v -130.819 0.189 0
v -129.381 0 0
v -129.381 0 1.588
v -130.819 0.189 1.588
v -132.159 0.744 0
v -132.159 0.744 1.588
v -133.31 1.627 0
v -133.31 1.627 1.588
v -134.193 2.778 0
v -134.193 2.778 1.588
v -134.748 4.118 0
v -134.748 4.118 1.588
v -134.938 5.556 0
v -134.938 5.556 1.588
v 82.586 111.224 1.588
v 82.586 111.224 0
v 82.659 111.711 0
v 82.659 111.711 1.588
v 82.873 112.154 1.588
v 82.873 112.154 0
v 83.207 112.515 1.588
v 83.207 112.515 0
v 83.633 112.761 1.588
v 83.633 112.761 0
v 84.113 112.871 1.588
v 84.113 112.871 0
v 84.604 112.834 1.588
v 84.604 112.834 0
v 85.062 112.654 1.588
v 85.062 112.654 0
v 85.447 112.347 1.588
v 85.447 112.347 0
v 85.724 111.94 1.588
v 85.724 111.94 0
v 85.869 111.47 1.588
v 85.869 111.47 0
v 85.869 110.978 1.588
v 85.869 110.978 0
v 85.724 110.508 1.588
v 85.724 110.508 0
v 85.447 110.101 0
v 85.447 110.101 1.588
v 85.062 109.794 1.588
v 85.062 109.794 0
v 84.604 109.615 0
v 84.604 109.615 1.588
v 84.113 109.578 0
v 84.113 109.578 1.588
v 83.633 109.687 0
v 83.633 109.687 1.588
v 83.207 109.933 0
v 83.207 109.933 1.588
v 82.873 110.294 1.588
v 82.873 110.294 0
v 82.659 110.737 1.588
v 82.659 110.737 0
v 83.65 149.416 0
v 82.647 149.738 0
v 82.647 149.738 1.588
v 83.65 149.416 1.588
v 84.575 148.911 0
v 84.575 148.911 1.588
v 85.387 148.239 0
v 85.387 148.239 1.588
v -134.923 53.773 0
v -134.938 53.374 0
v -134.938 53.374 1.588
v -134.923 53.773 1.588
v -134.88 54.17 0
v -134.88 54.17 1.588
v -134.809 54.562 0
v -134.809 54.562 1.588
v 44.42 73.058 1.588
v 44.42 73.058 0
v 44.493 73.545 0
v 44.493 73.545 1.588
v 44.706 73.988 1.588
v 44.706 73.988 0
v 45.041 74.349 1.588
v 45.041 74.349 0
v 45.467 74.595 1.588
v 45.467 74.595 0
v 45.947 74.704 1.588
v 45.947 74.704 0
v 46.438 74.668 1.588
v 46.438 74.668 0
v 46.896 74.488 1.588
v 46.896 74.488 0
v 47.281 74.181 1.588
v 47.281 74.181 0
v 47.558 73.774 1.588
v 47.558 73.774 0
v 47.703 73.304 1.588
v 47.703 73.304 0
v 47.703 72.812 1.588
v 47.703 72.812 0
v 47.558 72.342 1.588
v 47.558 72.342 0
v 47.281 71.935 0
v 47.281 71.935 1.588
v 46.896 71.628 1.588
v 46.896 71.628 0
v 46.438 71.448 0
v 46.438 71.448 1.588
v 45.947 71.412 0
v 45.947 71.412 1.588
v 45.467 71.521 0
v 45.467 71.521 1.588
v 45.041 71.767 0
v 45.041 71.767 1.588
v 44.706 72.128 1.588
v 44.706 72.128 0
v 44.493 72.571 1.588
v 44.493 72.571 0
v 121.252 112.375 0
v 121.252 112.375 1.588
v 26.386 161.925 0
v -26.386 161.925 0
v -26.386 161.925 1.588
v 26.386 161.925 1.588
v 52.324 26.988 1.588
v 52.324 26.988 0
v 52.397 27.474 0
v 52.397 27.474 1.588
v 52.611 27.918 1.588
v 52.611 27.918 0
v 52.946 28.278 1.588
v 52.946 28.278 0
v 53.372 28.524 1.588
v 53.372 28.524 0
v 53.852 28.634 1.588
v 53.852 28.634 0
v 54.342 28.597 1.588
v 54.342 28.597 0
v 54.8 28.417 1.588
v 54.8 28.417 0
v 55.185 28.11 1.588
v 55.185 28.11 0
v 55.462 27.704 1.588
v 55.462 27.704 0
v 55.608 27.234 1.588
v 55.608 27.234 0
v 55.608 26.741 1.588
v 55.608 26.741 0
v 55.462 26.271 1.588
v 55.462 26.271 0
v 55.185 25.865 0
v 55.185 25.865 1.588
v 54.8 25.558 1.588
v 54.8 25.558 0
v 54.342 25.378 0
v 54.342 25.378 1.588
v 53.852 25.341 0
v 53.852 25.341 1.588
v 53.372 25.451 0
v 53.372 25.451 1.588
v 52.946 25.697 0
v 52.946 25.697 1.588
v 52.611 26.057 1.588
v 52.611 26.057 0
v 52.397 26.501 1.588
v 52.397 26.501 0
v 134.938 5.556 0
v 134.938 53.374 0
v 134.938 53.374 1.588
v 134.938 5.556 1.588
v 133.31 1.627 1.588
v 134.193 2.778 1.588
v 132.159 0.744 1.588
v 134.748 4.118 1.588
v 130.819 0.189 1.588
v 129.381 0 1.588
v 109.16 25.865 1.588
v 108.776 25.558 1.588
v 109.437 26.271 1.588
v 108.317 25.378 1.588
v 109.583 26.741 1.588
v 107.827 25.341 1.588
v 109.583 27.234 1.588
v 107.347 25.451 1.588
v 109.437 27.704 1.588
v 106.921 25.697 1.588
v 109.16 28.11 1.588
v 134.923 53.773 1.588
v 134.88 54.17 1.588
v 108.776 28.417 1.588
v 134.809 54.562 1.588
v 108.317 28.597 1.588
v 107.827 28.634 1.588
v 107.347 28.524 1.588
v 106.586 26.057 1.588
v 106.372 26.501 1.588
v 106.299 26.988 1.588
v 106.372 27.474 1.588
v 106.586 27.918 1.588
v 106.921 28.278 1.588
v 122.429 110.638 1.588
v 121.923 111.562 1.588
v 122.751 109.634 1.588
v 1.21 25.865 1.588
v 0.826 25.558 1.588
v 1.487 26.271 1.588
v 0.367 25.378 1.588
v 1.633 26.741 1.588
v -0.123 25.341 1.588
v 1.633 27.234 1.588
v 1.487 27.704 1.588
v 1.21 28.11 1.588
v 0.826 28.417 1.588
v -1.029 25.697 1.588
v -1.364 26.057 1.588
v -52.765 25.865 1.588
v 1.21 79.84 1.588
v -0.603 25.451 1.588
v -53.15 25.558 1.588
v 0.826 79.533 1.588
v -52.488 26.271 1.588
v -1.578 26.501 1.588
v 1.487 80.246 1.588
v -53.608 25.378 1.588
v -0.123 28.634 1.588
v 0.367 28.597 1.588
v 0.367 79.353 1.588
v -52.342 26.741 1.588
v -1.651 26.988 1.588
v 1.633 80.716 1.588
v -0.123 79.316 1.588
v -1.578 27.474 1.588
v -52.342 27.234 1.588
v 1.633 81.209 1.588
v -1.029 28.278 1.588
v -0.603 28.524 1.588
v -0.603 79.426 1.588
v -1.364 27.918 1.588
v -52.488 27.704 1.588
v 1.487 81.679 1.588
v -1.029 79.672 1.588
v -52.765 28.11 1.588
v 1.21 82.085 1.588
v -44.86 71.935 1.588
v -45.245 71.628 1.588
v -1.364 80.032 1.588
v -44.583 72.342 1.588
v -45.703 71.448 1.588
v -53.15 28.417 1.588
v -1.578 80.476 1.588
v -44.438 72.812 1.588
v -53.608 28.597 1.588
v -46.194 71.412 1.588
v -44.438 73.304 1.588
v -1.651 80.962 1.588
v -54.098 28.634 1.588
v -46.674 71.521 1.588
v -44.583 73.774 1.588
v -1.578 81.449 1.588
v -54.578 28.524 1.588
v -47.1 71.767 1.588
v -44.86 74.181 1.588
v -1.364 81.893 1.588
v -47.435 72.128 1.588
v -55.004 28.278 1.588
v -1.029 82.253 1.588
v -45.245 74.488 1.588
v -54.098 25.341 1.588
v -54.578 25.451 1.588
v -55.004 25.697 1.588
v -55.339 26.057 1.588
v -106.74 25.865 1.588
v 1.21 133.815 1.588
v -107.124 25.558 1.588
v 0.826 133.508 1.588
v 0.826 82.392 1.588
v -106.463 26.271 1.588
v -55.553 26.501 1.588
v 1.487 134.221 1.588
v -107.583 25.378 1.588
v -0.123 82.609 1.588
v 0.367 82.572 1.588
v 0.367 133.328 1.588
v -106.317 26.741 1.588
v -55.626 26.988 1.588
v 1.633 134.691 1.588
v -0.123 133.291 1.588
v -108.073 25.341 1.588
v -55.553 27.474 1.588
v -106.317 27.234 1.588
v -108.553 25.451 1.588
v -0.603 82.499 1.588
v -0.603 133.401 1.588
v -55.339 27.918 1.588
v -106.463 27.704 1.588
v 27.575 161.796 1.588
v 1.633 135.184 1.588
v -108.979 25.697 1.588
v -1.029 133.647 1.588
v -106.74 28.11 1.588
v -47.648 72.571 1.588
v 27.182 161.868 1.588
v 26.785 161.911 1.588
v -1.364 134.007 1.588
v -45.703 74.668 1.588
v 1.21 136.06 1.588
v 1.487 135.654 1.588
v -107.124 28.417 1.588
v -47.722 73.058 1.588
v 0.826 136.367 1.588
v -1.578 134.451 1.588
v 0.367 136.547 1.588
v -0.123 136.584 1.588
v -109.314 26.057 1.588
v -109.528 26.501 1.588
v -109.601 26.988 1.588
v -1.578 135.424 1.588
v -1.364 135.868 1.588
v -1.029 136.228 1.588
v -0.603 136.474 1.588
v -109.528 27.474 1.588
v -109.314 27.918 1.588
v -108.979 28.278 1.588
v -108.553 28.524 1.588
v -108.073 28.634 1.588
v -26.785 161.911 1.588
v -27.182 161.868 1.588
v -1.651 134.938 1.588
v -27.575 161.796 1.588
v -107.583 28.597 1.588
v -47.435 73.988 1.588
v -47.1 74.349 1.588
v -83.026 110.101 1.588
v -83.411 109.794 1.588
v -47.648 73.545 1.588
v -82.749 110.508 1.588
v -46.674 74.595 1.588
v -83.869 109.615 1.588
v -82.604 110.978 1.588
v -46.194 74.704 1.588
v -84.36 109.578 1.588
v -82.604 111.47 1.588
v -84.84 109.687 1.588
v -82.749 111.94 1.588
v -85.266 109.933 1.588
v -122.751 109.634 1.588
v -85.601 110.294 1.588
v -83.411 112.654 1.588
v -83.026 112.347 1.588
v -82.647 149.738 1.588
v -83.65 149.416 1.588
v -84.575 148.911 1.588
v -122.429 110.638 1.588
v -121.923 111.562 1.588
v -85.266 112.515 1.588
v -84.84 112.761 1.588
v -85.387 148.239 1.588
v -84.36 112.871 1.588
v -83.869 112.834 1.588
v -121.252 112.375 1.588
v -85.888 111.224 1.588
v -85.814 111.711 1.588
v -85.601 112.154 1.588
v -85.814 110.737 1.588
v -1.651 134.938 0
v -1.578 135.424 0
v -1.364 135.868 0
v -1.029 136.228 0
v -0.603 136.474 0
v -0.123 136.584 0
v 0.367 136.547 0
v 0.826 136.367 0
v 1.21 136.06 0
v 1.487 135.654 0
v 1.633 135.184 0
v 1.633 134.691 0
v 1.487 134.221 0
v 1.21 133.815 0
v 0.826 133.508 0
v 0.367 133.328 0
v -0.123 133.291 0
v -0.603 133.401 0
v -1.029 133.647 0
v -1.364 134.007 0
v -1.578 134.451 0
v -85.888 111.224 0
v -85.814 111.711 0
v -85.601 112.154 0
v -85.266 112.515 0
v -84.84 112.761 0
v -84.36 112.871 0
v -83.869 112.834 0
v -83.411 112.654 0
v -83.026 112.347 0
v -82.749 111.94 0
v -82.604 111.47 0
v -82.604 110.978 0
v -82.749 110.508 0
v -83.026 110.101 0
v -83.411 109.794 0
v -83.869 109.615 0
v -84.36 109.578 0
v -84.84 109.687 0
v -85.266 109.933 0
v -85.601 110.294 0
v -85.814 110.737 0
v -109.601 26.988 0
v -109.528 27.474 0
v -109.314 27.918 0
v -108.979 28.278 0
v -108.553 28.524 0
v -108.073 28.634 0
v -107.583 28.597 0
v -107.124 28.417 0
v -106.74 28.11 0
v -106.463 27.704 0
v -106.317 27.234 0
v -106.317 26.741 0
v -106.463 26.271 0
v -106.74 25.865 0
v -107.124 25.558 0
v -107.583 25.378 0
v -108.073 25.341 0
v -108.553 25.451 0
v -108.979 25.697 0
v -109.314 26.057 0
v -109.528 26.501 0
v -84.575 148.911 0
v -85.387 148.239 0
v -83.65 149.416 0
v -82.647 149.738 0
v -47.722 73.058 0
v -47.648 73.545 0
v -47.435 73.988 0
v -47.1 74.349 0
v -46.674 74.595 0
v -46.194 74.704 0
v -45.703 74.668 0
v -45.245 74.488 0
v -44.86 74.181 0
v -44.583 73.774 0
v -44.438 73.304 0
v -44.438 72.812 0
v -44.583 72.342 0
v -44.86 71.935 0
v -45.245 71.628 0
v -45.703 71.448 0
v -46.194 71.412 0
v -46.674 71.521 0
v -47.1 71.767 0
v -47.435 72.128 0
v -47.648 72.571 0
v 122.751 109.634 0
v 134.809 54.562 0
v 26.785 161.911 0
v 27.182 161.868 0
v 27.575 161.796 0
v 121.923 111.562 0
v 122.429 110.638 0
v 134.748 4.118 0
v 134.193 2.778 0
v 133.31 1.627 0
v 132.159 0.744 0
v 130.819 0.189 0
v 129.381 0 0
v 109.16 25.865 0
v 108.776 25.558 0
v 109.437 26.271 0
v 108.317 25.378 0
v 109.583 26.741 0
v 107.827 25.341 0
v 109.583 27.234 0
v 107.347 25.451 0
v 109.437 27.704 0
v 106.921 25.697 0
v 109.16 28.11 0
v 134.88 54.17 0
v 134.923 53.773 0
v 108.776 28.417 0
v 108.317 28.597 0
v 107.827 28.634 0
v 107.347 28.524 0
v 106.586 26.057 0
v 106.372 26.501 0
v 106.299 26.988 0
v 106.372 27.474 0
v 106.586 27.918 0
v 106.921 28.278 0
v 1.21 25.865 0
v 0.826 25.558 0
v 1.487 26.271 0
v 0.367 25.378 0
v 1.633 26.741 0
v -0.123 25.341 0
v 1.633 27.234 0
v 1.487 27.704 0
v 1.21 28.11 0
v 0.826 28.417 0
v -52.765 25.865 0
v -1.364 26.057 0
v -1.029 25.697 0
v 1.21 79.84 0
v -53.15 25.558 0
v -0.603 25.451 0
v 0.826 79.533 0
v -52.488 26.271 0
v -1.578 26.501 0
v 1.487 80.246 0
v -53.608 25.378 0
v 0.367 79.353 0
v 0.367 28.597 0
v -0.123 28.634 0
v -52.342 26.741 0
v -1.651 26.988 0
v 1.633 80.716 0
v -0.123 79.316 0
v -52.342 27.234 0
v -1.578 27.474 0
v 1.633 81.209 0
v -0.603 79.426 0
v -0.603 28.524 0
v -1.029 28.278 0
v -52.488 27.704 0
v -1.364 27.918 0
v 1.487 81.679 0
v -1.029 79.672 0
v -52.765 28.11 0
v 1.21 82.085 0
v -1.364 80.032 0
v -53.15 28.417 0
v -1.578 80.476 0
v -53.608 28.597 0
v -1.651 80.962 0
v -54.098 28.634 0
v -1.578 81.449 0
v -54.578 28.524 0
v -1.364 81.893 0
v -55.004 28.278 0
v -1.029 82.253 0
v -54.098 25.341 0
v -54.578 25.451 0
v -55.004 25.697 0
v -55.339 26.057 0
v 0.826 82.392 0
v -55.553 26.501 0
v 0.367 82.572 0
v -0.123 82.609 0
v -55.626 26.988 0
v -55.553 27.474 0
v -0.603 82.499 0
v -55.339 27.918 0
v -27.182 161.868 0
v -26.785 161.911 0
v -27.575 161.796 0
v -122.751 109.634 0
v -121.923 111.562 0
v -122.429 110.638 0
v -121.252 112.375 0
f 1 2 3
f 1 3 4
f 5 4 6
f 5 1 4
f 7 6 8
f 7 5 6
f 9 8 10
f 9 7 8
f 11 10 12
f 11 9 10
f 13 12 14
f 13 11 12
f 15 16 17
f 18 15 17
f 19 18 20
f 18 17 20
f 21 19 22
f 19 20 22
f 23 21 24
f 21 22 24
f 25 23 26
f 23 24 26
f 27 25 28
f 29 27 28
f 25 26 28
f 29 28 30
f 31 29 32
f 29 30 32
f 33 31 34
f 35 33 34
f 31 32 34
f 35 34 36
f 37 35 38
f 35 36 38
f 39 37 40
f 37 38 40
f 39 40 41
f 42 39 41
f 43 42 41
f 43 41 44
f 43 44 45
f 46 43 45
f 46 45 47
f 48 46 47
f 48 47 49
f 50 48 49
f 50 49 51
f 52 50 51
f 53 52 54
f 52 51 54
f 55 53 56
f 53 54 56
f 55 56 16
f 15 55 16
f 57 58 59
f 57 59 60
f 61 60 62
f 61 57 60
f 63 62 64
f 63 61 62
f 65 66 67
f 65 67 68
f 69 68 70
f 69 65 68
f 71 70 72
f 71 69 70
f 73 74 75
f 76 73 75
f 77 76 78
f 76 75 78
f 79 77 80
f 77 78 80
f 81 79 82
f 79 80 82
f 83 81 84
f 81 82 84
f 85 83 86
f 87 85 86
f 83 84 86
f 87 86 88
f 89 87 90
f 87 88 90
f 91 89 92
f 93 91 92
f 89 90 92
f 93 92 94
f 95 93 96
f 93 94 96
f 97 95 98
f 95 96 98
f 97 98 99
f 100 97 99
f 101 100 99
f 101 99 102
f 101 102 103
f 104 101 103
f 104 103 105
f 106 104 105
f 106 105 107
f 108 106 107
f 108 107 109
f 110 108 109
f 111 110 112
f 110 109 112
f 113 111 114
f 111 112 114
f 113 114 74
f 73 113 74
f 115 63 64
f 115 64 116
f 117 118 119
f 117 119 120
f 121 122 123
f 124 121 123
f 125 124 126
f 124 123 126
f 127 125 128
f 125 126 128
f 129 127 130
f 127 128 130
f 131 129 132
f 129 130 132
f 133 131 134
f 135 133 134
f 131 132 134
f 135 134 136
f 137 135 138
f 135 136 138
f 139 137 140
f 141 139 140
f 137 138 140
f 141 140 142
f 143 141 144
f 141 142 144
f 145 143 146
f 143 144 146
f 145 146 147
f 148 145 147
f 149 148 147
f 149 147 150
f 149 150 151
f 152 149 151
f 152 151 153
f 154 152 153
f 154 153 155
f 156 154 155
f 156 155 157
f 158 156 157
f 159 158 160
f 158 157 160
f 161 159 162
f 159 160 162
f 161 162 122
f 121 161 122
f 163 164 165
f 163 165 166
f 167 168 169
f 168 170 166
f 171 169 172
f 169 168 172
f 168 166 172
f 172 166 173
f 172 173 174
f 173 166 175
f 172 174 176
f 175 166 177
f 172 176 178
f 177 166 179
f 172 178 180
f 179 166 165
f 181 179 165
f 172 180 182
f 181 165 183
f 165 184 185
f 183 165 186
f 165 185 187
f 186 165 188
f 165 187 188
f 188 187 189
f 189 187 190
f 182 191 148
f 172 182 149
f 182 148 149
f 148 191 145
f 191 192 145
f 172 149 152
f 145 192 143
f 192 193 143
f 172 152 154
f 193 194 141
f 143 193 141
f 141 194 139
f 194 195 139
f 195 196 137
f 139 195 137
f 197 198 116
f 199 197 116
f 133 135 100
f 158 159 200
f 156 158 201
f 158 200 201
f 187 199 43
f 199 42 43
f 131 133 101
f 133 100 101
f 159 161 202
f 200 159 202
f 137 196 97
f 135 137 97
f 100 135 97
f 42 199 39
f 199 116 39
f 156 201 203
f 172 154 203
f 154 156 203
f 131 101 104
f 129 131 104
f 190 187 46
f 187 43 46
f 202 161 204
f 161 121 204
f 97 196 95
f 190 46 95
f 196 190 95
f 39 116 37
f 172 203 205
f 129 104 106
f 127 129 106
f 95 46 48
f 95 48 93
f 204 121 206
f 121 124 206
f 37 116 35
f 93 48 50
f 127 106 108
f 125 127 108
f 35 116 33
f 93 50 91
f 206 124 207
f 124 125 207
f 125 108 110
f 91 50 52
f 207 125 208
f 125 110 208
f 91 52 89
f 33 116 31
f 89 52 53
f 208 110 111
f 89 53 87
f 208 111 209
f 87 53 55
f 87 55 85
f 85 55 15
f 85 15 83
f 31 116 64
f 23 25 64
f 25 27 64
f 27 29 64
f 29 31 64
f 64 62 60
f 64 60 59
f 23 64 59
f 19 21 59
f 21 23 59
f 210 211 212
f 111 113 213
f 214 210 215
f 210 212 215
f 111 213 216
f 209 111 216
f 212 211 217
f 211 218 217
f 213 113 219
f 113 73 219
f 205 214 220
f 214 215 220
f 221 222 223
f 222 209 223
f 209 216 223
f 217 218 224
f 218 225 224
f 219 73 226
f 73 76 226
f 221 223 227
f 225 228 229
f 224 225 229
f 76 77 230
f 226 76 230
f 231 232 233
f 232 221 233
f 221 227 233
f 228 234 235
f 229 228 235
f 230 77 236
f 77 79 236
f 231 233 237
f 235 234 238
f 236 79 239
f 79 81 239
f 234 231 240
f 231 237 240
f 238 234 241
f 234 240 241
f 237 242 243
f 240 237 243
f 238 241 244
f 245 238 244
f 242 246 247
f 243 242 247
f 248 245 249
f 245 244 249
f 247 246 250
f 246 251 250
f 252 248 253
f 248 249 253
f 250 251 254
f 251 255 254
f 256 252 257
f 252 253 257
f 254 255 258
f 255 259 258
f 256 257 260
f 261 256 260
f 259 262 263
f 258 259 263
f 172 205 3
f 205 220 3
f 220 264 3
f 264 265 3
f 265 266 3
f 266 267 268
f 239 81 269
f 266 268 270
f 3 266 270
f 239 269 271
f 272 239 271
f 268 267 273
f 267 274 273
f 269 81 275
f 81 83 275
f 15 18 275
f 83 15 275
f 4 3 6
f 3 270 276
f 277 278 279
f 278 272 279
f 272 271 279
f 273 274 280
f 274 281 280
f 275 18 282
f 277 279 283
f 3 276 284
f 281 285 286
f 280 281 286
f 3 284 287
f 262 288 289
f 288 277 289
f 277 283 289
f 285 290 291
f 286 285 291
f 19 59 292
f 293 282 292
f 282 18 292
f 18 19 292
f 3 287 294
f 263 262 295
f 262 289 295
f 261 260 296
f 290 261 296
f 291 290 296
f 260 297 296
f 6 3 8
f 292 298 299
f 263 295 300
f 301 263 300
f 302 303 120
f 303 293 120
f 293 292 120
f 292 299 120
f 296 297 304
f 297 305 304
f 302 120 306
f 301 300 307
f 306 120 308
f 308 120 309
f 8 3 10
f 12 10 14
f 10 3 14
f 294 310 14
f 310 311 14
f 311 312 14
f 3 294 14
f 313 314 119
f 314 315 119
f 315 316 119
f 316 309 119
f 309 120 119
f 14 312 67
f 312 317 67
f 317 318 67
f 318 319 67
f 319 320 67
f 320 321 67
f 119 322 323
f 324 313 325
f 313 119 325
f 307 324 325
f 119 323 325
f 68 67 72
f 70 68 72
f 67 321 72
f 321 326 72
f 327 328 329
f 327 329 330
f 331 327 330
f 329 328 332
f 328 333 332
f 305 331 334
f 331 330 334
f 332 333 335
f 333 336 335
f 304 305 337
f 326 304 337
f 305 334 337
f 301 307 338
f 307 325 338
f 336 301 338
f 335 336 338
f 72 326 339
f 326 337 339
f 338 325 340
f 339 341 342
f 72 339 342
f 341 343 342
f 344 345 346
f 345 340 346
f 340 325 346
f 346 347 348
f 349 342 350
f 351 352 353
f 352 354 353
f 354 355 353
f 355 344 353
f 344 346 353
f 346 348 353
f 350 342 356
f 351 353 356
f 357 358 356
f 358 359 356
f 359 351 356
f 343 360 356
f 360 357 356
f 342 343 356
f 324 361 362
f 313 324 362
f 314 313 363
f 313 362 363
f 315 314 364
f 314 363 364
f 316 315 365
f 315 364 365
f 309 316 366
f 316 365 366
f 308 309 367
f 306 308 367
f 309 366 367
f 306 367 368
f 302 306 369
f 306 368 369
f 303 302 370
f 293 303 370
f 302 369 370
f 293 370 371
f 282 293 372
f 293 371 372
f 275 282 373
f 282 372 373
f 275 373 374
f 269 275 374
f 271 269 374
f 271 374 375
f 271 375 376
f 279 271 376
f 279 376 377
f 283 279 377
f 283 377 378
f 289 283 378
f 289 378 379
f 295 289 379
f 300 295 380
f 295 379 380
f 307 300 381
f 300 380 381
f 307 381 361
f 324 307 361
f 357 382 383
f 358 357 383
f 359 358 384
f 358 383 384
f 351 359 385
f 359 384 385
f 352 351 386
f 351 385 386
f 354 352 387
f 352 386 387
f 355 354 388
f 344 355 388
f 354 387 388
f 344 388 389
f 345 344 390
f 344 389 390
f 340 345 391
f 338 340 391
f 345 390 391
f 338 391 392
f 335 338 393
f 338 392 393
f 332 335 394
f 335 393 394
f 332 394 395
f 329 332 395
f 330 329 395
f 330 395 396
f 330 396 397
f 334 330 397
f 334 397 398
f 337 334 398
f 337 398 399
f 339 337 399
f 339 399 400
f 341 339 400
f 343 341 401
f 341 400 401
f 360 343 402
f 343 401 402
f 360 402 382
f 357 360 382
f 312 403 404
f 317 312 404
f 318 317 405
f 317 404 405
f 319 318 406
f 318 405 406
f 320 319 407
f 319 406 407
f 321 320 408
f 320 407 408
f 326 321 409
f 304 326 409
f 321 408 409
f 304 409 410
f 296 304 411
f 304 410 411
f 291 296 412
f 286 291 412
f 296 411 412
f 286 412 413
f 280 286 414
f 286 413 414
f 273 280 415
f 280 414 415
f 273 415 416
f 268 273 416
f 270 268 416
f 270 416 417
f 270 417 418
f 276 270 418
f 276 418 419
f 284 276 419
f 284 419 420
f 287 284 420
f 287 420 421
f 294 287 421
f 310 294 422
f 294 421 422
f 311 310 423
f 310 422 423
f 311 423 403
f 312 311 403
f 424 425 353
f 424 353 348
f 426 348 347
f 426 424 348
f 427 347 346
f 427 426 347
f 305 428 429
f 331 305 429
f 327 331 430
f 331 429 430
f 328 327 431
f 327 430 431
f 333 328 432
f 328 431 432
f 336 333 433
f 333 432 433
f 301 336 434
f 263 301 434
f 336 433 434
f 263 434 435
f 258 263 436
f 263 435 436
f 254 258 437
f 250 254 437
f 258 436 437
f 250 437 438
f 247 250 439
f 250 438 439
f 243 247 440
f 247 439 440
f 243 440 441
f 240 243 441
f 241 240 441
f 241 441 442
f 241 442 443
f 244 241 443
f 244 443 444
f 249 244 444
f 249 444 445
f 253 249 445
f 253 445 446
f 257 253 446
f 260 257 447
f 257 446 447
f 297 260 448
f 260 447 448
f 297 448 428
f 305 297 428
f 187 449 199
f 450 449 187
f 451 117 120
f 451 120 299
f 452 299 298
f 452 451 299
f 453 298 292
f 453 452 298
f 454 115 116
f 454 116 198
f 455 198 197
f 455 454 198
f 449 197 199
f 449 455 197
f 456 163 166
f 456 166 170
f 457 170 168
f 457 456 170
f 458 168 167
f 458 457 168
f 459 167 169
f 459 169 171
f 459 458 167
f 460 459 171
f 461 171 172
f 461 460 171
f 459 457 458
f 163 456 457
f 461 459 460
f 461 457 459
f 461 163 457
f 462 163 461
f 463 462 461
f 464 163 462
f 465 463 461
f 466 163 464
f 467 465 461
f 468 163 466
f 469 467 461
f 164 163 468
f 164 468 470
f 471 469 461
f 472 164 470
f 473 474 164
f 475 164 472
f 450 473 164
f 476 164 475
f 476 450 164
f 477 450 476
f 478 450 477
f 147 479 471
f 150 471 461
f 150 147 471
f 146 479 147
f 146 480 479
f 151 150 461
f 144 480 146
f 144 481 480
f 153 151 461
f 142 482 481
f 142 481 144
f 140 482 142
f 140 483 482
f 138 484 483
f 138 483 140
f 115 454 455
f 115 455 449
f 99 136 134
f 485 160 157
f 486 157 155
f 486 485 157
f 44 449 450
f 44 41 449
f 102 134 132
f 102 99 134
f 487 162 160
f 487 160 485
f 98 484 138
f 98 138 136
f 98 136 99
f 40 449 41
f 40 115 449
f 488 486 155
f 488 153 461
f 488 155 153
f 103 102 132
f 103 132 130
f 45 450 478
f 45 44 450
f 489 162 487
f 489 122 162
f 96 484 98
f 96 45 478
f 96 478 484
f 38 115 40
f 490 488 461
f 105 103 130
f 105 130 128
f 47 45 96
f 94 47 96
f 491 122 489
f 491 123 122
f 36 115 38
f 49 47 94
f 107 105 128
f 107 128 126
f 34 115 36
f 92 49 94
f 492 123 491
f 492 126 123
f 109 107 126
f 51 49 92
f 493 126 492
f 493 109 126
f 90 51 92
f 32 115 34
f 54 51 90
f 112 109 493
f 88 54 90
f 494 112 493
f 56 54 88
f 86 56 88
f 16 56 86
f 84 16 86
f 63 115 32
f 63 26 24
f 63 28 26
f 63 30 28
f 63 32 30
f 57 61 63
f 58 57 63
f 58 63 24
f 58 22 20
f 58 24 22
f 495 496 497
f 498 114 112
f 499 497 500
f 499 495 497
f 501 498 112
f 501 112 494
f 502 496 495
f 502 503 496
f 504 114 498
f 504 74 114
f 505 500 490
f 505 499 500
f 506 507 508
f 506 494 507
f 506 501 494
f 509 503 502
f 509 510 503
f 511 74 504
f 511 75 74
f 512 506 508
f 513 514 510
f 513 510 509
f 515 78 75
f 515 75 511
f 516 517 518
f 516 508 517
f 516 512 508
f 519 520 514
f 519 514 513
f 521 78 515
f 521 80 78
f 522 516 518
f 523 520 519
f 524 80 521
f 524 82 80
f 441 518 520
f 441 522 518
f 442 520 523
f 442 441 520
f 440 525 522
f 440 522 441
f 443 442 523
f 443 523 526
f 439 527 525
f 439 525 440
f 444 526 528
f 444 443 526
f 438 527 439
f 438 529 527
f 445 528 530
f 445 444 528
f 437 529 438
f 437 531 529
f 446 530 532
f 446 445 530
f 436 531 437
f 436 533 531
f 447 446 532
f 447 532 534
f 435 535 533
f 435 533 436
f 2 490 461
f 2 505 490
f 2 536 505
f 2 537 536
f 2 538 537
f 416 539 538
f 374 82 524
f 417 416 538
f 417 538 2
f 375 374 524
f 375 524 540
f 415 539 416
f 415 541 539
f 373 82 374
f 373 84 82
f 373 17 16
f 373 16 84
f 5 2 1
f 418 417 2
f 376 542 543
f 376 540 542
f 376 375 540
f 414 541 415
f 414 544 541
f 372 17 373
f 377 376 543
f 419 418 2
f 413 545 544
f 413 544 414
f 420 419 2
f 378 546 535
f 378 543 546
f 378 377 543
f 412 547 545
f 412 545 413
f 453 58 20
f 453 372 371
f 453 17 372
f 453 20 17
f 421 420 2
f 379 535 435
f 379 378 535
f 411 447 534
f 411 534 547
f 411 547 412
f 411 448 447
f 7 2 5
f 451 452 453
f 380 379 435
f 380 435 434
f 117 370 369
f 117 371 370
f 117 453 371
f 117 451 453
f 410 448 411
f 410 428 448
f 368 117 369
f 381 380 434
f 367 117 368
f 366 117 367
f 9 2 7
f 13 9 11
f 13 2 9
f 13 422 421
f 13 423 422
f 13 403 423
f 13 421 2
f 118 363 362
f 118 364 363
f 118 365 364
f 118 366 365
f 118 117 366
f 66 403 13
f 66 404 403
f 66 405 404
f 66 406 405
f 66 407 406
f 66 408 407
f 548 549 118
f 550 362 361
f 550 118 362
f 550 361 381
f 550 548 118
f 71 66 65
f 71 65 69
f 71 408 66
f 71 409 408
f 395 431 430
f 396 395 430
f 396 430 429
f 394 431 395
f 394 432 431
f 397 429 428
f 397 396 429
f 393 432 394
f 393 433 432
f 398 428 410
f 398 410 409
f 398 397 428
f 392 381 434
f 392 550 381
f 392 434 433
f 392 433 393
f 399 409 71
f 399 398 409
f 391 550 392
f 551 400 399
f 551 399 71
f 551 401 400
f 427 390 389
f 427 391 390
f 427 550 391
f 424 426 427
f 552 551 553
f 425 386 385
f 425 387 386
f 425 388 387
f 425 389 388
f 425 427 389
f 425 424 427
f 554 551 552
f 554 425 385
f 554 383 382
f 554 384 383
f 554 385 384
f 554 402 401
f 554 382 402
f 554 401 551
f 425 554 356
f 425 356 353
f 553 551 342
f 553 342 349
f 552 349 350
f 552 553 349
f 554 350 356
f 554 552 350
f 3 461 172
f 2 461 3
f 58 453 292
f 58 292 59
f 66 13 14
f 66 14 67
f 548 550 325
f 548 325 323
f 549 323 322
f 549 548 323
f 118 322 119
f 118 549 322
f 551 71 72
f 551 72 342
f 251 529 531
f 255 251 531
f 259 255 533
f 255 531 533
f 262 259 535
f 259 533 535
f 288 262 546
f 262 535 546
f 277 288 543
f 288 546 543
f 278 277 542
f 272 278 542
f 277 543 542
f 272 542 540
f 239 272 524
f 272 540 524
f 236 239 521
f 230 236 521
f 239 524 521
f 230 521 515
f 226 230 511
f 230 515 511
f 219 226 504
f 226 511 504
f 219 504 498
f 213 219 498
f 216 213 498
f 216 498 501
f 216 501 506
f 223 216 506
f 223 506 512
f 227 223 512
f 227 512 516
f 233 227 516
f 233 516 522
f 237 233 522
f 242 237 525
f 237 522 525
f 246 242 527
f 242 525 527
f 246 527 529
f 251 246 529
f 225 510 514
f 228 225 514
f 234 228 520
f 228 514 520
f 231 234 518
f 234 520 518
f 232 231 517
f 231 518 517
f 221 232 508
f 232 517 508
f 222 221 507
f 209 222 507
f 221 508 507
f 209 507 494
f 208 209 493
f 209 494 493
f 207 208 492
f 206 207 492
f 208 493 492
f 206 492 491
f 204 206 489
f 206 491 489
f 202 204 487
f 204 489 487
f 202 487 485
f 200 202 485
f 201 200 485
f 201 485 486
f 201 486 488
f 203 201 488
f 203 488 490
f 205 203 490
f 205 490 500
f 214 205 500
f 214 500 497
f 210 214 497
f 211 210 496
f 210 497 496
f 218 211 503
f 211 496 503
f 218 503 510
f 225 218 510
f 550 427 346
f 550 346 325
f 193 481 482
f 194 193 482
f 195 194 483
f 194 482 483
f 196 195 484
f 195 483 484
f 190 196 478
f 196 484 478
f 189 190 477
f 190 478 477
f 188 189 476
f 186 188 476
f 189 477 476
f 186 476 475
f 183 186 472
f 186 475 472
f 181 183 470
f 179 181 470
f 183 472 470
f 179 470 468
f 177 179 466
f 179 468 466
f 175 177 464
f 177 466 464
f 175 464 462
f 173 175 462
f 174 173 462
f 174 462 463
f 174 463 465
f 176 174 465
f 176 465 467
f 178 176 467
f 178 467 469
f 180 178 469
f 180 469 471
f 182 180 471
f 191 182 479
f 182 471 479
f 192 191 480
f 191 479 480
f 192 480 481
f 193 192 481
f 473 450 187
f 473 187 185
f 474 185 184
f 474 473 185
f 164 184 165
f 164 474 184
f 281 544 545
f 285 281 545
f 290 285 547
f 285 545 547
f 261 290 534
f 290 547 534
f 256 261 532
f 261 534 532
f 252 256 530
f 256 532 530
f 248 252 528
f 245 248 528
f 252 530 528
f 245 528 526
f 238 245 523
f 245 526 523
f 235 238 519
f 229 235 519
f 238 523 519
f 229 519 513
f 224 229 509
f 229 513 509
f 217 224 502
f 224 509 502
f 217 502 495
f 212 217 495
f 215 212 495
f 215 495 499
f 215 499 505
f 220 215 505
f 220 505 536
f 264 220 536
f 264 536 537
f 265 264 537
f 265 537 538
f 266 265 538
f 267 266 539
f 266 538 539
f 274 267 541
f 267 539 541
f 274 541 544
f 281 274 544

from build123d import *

# Parameters (mm, degrees)
SKETCH1_R           = 1.651
BOSS_EXTRUDE1_DEPTH = 1.5875


with BuildPart() as part:
    # Sketch1 → Boss-Extrude1 (new body)
    with BuildSketch(Plane(origin=(0, 0, 0), x_dir=(-1, 0, 0), z_dir=(0, 0, -1))):
        with BuildLine():
            Line((-129.38125, 0), (129.38125, 0))
            ThreePointArc((129.38125, 0), (133.310112053, 1.627387947), (134.9375, 5.55625))
            Line((134.9375, 5.55625), (134.9375, 53.373846086))
            ThreePointArc((134.9375, 53.373846086), (134.905262076, 53.971512085), (134.8089224, 54.562242647))
            Line((134.8089224, 54.562242647), (122.750794586, 109.634404323))
            ThreePointArc((122.750794586, 109.634404323), (122.197927005, 111.112127049), (121.251984239, 112.374869817))
            Line((121.251984239, 112.374869817), (85.387369836, 148.239484219))
            ThreePointArc((85.387369836, 148.239484219), (84.124627068, 149.185426985), (82.646904343, 149.738294567))
            Line((82.646904343, 149.738294567), (27.574742607, 161.796422401))
            ThreePointArc((27.574742607, 161.796422401), (26.984012045, 161.892762078), (26.386346045, 161.925000002))
            Line((26.386346045, 161.925000002), (-26.386346022, 161.925000002))
            ThreePointArc((-26.386346022, 161.925000002), (-26.984012021, 161.892762078), (-27.574742583, 161.796422402))
            Line((-27.574742583, 161.796422402), (-82.646904321, 149.738294575))
            ThreePointArc((-82.646904321, 149.738294575), (-84.124627046, 149.185426993), (-85.387369815, 148.239484227))
            Line((-85.387369815, 148.239484227), (-121.251984217, 112.374869825))
            ThreePointArc((-121.251984217, 112.374869825), (-122.197926983, 111.112127057), (-122.750794565, 109.634404332))
            Line((-122.750794565, 109.634404332), (-134.808922399, 54.562242596))
            ThreePointArc((-134.808922399, 54.562242596), (-134.905262076, 53.971512033), (-134.9375, 53.373846033))
            Line((-134.9375, 53.373846033), (-134.9375, 5.55625))
            ThreePointArc((-134.9375, 5.55625), (-133.310112053, 1.627387947), (-129.38125, 0))
        make_face()
        with Locations((-53.975, 26.9875)):
            Circle(SKETCH1_R, mode=Mode.SUBTRACT)
        with Locations((53.975, 26.9875)):
            Circle(SKETCH1_R, mode=Mode.SUBTRACT)
        with Locations((46.070544257, 73.058044257)):
            Circle(SKETCH1_R, mode=Mode.SUBTRACT)
        with Locations((84.236632771, 111.224132771)):
            Circle(SKETCH1_R, mode=Mode.SUBTRACT)
        with Locations((-46.070544257, 73.058044257)):
            Circle(SKETCH1_R, mode=Mode.SUBTRACT)
        with Locations((-84.236632771, 111.224132771)):
            Circle(SKETCH1_R, mode=Mode.SUBTRACT)
        with Locations((-107.95, 26.9875)):
            Circle(SKETCH1_R, mode=Mode.SUBTRACT)
        with Locations((107.95, 26.9875)):
            Circle(SKETCH1_R, mode=Mode.SUBTRACT)
        with Locations((0, 80.9625)):
            Circle(SKETCH1_R, mode=Mode.SUBTRACT)
        with Locations((0, 134.9375)):
            Circle(SKETCH1_R, mode=Mode.SUBTRACT)
        with Locations((0, 26.9875)):
            Circle(SKETCH1_R, mode=Mode.SUBTRACT)
    extrude(amount=-BOSS_EXTRUDE1_DEPTH)


solid = part.part
